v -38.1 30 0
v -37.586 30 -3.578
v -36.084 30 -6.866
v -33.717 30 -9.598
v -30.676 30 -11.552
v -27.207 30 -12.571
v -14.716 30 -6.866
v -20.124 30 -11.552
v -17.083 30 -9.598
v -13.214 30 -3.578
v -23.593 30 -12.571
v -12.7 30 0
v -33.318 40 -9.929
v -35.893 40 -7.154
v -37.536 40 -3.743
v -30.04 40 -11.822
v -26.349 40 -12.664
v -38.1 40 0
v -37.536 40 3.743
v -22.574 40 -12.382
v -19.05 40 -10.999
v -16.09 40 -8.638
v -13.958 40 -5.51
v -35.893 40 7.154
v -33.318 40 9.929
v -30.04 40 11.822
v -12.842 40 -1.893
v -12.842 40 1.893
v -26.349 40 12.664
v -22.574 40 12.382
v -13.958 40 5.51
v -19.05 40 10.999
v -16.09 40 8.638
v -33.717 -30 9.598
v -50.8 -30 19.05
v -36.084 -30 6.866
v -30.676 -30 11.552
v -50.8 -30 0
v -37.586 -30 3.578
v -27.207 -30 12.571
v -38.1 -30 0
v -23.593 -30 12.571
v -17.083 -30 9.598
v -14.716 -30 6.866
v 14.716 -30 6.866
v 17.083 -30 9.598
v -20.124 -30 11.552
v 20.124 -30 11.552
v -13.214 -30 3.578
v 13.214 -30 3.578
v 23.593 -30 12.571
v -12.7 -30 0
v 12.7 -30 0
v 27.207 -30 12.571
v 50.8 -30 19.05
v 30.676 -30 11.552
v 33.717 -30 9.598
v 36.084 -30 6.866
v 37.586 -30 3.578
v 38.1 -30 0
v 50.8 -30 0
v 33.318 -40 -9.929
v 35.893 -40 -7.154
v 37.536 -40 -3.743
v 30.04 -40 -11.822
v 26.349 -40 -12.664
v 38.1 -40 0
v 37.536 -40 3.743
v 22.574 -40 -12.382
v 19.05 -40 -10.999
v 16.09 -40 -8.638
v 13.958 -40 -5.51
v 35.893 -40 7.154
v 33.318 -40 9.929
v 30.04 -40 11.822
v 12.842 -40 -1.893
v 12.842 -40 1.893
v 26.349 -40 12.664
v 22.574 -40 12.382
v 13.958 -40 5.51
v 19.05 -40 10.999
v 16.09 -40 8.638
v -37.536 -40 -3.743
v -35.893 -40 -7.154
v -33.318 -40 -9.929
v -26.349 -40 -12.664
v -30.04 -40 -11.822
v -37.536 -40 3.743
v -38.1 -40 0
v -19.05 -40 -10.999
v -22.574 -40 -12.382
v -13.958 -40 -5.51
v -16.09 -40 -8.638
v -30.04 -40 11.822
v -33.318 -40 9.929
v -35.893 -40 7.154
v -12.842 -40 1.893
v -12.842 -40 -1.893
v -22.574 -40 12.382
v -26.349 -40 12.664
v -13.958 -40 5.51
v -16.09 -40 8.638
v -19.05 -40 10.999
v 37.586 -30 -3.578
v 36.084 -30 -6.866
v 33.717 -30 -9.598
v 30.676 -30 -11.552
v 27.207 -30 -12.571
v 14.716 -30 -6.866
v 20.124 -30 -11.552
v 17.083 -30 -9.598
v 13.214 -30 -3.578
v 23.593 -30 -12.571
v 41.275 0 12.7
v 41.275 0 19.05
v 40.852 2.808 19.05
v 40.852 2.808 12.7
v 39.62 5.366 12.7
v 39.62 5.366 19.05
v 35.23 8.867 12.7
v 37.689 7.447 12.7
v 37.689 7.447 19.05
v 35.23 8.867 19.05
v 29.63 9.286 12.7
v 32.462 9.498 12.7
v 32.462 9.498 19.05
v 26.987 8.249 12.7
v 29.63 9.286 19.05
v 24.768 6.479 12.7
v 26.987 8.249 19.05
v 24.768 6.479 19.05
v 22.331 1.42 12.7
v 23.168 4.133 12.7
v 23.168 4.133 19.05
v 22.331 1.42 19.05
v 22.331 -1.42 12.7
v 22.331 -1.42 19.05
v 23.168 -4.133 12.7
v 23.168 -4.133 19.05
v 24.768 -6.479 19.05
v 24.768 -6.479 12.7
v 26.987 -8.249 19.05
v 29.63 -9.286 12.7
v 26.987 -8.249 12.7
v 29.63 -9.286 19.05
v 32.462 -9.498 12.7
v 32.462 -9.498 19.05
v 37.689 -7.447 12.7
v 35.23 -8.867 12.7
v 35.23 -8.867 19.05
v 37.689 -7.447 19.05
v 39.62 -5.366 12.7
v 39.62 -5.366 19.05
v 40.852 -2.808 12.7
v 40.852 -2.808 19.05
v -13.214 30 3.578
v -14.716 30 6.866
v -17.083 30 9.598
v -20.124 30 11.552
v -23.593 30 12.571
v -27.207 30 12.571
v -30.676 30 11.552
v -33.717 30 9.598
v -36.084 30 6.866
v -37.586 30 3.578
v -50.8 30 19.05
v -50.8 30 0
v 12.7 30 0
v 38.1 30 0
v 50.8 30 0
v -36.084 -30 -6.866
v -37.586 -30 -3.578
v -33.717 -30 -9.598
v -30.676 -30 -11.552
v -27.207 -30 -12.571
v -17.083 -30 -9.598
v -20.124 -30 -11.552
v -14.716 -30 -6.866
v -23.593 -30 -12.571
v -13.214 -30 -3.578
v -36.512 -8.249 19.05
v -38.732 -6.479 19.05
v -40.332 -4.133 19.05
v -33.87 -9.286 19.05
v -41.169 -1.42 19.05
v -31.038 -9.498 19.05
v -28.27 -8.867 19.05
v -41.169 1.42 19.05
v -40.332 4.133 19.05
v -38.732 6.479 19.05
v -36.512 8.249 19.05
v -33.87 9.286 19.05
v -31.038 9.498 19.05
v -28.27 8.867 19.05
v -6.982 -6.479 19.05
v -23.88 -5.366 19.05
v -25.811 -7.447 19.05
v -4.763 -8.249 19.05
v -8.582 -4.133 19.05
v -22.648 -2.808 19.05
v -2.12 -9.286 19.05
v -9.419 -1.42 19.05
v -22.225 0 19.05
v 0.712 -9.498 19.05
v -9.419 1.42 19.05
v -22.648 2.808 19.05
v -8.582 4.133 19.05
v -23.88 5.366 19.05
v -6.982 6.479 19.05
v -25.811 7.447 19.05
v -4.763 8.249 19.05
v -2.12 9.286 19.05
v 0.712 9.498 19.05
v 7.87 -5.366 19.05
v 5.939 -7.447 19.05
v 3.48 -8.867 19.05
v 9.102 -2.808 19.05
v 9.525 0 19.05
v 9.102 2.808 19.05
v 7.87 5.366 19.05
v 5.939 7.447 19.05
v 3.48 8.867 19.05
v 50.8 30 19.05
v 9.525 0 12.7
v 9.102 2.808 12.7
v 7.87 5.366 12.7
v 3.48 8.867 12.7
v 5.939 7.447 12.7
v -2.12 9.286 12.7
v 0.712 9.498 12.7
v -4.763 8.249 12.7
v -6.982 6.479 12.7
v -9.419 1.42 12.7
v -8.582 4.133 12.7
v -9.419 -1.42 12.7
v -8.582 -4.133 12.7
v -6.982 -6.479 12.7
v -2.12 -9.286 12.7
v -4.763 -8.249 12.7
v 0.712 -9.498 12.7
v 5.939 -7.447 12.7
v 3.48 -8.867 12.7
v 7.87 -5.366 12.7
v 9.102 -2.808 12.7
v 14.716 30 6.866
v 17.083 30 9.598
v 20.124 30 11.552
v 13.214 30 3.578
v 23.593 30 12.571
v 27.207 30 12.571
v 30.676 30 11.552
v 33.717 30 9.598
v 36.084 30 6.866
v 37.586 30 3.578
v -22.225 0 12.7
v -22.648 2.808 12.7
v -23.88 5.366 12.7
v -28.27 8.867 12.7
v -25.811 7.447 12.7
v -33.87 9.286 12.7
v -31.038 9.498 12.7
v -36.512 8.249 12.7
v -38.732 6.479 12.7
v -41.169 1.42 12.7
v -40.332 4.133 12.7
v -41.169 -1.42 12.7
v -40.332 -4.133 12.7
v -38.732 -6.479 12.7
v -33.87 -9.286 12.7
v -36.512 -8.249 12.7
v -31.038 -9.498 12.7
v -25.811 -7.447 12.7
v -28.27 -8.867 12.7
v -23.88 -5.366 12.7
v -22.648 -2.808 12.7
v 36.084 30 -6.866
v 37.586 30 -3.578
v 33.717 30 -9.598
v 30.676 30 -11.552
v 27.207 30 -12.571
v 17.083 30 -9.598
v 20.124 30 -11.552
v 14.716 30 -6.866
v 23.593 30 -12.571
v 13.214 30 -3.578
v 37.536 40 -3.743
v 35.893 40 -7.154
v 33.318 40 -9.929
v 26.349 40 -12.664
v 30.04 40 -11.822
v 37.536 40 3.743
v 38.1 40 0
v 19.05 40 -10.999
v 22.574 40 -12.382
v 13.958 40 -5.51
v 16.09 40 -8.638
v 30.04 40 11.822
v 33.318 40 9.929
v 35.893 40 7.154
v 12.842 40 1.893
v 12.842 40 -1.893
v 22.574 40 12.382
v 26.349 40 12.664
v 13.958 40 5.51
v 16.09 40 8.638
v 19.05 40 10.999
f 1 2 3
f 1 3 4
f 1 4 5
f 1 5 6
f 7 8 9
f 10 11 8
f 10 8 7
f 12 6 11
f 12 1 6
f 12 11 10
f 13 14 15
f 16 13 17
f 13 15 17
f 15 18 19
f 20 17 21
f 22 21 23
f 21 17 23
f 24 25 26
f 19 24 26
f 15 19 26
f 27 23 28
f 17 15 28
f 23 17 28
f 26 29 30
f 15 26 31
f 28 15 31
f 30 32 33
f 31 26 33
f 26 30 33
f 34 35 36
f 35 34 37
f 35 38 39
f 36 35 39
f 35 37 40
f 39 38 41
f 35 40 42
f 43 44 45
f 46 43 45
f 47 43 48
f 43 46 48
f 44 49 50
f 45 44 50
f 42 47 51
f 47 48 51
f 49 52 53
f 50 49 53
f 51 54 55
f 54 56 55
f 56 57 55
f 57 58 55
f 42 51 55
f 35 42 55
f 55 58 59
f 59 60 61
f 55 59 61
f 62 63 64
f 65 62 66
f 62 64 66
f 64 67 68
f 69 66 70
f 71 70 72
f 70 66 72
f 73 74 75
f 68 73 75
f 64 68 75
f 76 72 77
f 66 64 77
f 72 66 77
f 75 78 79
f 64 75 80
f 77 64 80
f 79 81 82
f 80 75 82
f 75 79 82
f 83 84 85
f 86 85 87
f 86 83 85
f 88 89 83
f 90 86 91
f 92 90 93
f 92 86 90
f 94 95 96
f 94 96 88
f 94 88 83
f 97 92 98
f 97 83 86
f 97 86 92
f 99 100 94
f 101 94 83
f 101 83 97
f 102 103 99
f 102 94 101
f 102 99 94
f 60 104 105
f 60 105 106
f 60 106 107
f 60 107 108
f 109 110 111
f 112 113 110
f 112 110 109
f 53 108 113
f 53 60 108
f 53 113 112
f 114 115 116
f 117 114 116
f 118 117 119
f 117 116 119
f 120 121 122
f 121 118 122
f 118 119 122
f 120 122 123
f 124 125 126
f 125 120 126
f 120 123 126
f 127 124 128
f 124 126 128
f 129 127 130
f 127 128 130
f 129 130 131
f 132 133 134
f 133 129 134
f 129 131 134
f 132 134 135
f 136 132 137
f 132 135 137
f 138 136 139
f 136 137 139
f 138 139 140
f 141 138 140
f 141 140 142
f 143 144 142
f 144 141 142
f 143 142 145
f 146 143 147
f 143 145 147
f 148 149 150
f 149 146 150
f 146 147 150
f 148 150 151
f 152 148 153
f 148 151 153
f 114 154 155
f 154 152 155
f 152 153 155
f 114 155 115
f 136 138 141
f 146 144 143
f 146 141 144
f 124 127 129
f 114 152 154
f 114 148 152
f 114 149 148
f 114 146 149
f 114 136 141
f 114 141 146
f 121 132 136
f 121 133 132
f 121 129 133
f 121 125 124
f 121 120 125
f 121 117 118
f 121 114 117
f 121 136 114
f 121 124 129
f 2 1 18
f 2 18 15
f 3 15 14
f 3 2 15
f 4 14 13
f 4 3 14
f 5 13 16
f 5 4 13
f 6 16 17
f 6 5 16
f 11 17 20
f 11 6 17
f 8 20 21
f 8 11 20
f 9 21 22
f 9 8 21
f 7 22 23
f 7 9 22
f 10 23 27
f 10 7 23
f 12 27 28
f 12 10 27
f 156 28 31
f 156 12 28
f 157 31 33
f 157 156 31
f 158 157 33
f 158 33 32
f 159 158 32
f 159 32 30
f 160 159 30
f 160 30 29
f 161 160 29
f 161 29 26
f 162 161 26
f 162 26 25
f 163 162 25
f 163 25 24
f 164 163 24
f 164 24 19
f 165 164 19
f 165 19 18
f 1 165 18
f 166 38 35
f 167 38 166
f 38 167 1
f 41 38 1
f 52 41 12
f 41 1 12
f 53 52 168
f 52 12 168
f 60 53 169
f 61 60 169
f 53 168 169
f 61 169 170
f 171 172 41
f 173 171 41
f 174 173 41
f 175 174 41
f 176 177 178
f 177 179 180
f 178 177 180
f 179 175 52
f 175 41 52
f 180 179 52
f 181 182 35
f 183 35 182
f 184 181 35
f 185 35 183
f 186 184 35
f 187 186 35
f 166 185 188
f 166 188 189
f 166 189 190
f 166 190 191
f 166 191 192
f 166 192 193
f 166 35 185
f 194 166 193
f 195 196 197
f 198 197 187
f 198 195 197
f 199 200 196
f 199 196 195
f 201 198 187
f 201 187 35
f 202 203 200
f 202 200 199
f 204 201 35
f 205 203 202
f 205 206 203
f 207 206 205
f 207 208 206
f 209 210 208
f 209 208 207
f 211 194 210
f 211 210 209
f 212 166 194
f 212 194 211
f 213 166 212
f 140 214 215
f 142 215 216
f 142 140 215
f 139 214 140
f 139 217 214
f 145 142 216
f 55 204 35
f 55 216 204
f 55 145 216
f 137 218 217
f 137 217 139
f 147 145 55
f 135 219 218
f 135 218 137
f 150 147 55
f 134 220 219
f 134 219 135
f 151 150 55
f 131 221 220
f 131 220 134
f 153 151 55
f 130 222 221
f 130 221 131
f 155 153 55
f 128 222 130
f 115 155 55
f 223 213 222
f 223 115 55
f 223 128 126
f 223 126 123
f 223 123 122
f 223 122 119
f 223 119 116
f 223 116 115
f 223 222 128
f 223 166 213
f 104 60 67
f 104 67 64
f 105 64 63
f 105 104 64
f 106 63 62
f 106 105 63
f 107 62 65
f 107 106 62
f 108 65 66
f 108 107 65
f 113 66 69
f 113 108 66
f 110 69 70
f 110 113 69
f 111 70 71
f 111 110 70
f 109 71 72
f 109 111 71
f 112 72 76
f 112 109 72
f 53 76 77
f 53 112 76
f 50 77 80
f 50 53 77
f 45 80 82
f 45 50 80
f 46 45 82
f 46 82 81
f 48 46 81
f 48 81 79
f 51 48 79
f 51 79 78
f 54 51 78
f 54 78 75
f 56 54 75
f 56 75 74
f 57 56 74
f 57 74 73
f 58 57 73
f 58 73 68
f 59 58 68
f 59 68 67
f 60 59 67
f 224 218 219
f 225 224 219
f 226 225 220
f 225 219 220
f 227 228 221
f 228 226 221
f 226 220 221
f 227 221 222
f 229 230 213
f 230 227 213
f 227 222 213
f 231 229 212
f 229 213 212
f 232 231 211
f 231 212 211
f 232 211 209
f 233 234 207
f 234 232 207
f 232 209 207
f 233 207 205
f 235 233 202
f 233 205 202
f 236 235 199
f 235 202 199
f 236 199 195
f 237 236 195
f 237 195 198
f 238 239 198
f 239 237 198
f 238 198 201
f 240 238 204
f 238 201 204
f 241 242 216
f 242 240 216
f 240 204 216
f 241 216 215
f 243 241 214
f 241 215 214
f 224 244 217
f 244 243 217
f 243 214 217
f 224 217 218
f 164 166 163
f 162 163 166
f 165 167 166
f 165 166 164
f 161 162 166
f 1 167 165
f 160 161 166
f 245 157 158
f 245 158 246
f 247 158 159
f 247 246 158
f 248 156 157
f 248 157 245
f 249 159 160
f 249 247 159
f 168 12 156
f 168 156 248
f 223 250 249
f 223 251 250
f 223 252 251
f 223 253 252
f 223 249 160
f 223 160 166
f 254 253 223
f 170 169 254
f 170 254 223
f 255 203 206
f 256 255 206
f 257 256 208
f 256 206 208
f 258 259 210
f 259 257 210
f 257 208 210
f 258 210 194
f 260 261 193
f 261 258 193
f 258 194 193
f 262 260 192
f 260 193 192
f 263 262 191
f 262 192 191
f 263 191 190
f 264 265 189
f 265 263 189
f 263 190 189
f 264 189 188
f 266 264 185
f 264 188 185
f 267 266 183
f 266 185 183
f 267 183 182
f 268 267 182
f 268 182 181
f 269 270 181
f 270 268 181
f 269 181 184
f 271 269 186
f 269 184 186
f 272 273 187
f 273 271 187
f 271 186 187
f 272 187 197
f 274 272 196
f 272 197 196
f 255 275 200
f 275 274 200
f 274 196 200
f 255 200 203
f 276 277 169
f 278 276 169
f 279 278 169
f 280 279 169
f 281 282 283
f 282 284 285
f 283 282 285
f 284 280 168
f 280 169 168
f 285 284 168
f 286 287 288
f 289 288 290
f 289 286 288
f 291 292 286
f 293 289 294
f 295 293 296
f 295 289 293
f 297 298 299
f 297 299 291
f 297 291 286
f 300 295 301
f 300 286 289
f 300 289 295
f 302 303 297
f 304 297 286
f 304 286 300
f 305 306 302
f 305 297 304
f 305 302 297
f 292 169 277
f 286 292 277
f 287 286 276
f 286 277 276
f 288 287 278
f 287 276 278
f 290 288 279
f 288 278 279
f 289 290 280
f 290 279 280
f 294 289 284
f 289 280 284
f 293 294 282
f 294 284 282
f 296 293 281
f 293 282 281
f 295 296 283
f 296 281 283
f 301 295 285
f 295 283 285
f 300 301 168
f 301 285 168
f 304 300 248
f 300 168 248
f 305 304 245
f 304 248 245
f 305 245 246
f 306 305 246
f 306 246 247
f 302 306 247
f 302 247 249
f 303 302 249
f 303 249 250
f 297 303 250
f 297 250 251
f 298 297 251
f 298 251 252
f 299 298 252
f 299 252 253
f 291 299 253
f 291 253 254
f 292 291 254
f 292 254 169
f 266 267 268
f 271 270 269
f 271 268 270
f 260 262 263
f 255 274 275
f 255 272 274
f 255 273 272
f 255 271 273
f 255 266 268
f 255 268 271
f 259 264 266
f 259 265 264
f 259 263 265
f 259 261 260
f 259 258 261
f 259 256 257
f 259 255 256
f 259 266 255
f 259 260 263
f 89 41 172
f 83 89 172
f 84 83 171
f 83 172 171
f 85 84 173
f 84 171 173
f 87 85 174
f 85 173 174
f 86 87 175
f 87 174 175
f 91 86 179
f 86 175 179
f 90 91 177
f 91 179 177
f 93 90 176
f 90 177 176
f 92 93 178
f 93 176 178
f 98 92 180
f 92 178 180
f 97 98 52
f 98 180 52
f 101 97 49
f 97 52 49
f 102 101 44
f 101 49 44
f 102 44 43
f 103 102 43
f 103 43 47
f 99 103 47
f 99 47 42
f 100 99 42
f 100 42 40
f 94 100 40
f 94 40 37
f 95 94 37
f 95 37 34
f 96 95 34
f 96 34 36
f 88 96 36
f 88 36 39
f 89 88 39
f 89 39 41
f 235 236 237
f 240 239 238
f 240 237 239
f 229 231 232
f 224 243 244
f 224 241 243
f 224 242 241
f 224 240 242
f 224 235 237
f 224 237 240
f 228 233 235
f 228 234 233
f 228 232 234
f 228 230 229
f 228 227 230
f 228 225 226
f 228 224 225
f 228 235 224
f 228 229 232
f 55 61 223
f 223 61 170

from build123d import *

# Parameters (mm, degrees)
F0_W     = 101.6
F0_H     = 60
F1_DEPTH = 19.05
F2_R     = 9.525
F3_DEPTH = 6.35
F5_DEPTH = 10


# Not quite as in the source:
# - a length typed as a fraction of an inch, garbled in the dataset ("3 / 203.2 mm" for 3/8 in), is restored


with BuildPart() as f1:
    # F0 (on Top) → F1 (new body)
    with BuildSketch(Plane.XY):
        Rectangle(F0_W, F0_H)
    extrude(amount=F1_DEPTH)

    # F2 (on face) → F3 (cut)
    with BuildSketch(Plane.XY.offset(19.05)):
        Circle(F2_R)
        with Locations((31.75, 0)):
            Circle(F2_R)
        with Locations((-31.75, 0)):
            Circle(F2_R)
    extrude(amount=-F3_DEPTH, mode=Mode.SUBTRACT)

    # F4 (on face) → F5 (join)
    with BuildSketch(Plane(origin=(0, 30, 0), x_dir=(-1, 0, 0), z_dir=(0, 1, 0))):
        with BuildLine():
            ThreePointArc((-12.7, 0), (-25.4, 12.7), (-38.1, 0))
            Line((-38.1, 0), (-25.4, 0))
            Line((-25.4, 0), (-12.7, 0))
        make_face()
        with BuildLine():
            Line((-25.4, 0), (-38.1, 0))
            ThreePointArc((-38.1, 0), (-25.4, -12.7), (-12.7, 0))
            Line((-12.7, 0), (-25.4, 0))
        make_face()
    extrude(amount=F5_DEPTH)


with BuildPart() as f6_1:
    # F6: instance of F1
    add(f1.part.mirror(Plane.YZ))


with BuildPart() as f1_1:
    add(f1.part)

    add(f6_1.part)  # F7 merges F6_1
    # F7: F6_1, F1 across plane
    add(f6_1.part.mirror(Plane.XZ))
    add(f1.part.mirror(Plane.XZ))


solid = f1_1.part
